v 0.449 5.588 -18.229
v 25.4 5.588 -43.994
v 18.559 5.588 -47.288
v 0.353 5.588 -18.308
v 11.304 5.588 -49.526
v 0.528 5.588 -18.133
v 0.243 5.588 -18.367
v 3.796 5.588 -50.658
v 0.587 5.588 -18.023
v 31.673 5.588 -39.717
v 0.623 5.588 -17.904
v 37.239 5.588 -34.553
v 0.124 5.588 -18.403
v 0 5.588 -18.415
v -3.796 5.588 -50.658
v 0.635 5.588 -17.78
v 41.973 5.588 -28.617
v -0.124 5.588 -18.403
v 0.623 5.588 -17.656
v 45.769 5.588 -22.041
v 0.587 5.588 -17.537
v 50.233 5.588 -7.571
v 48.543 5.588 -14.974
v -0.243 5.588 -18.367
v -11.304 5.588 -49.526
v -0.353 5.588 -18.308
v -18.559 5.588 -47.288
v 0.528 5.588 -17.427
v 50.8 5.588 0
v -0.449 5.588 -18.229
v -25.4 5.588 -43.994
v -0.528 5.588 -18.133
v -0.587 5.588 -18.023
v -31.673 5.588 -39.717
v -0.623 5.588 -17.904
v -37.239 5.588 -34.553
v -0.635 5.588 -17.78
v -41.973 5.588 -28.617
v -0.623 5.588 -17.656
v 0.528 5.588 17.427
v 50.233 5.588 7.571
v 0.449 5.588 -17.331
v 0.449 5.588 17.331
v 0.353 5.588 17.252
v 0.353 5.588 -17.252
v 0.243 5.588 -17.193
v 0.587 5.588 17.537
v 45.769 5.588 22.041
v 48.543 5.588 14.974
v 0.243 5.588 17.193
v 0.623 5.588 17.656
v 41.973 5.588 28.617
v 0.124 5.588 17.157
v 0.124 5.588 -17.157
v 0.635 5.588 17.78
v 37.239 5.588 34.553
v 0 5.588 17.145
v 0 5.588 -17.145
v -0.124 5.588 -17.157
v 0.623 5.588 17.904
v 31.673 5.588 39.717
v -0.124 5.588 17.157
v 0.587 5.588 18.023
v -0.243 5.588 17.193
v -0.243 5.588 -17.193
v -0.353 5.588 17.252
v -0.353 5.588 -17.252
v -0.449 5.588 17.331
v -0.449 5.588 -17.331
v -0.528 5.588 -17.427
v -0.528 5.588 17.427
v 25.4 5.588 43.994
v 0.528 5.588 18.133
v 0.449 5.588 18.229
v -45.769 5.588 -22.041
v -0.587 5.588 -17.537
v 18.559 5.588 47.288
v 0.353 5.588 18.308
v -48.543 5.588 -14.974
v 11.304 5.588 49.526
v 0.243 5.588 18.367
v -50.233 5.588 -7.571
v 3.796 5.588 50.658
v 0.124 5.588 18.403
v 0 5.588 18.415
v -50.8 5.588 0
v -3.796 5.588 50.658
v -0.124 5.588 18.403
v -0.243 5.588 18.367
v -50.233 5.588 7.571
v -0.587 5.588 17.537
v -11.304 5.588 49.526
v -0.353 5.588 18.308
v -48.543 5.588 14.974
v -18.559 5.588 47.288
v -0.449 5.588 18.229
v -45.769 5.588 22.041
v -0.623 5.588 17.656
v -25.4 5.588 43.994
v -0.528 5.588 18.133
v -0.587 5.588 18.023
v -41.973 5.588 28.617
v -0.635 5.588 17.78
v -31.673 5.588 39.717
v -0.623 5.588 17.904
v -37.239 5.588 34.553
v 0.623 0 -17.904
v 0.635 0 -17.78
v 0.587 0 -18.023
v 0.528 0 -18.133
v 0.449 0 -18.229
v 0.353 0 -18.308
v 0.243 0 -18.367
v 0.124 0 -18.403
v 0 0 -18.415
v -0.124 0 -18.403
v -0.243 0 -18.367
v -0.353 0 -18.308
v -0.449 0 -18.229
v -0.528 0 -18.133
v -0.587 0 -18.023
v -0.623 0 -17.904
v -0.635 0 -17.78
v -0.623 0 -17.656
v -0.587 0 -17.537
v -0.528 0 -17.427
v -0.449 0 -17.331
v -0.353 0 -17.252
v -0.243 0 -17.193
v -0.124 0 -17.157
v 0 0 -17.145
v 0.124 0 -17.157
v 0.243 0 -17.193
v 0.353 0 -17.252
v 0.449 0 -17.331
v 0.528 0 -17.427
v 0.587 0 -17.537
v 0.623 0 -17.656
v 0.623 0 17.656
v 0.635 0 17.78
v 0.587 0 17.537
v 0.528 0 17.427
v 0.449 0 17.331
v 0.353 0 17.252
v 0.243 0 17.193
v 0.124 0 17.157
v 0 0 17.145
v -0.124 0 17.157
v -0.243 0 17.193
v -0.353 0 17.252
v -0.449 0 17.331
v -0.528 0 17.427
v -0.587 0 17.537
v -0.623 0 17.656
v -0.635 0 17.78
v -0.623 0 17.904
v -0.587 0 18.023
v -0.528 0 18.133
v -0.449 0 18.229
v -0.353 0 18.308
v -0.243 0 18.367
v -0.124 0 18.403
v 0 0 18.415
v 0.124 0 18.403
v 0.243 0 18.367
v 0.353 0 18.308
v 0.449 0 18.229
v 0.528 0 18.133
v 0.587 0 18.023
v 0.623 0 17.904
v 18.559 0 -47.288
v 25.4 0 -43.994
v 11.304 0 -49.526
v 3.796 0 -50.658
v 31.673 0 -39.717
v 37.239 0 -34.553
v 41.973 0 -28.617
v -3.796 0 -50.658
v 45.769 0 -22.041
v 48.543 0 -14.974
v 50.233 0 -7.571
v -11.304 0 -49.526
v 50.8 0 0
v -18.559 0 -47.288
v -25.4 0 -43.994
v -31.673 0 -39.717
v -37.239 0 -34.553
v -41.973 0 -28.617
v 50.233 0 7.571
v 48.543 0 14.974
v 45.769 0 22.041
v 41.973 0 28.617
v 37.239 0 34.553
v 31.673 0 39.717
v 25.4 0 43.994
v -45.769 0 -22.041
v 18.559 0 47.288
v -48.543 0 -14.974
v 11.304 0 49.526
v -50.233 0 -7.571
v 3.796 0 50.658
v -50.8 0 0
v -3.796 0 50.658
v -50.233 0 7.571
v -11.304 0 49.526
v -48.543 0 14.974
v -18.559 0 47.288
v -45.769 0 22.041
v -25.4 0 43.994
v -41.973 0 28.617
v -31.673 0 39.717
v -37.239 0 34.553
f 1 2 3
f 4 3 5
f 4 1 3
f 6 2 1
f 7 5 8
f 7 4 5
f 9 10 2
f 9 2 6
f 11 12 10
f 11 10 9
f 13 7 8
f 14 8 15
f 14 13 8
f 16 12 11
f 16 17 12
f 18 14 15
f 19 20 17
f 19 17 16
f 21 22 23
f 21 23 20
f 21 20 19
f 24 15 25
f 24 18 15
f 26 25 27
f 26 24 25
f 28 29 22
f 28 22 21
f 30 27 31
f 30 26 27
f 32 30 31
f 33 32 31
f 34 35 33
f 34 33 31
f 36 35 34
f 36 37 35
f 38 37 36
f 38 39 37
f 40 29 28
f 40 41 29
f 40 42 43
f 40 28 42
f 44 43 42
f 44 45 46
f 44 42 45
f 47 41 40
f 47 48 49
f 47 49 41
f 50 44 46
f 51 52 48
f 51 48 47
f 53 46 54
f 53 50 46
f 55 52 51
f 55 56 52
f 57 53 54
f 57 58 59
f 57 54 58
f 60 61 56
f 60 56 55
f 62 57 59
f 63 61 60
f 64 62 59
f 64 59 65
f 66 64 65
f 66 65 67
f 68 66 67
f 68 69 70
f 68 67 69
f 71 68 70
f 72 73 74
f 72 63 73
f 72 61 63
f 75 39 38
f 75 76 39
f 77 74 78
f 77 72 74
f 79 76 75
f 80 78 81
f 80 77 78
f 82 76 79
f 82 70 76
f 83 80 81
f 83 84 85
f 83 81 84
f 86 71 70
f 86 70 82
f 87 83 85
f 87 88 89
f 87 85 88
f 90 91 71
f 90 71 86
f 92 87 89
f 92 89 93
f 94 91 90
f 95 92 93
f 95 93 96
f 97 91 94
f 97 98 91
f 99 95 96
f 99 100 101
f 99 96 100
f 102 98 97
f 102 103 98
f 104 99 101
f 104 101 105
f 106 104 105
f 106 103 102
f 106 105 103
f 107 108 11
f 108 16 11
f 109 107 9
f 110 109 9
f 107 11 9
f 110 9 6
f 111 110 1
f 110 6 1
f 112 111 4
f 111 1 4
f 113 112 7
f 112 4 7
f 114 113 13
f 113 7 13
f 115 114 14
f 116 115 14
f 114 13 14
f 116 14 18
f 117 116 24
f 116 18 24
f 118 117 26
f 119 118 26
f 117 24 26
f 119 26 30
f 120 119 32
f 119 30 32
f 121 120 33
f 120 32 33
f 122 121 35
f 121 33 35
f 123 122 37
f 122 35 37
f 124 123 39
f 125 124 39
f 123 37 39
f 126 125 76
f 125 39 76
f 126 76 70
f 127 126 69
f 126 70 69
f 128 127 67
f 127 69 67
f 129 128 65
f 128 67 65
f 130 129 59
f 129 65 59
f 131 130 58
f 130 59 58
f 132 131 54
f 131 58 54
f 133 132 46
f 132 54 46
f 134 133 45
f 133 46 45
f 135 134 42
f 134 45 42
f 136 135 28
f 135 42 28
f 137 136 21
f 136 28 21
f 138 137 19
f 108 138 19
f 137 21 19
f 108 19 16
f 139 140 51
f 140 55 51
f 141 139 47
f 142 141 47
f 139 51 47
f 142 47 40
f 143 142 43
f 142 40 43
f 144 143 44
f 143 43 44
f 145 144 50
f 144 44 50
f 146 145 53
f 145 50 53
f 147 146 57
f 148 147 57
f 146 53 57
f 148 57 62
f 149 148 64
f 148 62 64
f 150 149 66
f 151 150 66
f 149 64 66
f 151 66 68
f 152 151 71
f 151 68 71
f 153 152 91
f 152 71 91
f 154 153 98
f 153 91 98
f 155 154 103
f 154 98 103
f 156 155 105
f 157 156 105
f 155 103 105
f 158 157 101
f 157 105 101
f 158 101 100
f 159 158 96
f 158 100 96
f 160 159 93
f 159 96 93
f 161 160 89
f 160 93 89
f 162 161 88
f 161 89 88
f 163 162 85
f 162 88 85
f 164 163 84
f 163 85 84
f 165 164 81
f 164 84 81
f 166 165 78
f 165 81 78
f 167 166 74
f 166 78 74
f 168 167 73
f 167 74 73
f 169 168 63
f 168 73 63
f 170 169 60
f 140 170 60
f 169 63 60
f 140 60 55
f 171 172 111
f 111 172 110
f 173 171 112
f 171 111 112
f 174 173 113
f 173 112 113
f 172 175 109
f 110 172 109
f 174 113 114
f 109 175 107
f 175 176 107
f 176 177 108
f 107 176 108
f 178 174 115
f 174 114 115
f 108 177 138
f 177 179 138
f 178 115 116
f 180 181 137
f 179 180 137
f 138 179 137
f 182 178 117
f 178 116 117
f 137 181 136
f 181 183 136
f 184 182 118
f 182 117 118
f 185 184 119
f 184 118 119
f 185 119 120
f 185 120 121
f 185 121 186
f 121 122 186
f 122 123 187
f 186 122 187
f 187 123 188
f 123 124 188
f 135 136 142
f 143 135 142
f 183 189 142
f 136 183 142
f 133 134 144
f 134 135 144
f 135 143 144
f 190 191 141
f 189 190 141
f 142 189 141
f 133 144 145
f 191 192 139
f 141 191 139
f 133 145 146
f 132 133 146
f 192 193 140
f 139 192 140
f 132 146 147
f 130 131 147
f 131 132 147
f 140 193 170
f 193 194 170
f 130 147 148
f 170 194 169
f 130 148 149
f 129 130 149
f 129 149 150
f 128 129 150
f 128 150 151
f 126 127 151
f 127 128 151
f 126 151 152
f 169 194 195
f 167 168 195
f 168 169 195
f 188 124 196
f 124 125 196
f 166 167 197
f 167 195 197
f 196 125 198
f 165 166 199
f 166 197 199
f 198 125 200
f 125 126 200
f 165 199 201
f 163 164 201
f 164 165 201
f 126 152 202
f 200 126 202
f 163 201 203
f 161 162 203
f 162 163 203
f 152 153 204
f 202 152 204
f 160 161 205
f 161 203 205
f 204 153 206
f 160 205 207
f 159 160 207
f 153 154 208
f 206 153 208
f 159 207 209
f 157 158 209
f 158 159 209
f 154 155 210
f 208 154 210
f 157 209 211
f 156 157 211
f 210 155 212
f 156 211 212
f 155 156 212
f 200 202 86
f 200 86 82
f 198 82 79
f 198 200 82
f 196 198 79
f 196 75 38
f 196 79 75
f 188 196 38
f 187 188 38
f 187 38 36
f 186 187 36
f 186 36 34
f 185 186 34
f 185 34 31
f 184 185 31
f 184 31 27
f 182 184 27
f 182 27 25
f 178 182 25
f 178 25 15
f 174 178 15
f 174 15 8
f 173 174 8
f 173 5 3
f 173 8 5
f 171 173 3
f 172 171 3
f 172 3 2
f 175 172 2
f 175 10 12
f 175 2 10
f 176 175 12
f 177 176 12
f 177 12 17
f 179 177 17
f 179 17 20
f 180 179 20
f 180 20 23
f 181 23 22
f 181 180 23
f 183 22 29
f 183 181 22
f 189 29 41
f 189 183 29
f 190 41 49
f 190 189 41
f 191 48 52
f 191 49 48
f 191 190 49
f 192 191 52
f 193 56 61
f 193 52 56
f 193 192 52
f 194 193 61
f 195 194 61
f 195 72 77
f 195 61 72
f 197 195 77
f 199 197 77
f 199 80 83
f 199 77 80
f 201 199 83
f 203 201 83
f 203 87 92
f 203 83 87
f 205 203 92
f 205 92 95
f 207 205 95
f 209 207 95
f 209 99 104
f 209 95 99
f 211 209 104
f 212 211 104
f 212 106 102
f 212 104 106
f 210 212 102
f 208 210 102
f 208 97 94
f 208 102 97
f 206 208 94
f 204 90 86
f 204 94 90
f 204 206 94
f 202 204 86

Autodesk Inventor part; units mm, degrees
ref_plane "YZ Plane" through (0, 0, 0) normal (1, 0, 0) x (0, 1, 0)
ref_plane "XZ Plane" through (0, 0, 0) normal (0, 1, 0) x (-1, 0, 0)
ref_plane "XY Plane" through (0, 0, 0) normal (0, 0, 1) x (1, 0, 0)
sketch "Sketch1" plane through (0, 0, 0) normal (0, 1, 0) x (-1, 0, 0)
  circle A0 centre (0, 0) radius 50.8
  dimension "d0" = 101.6
extrude "Extrusion1" add sketch "Sketch1" along normal blind 5.588
sketch "Sketch2" plane through (0, 5.588, 0) normal (0, 1, 0) x (1, 0, 0)
  circle A0 centre (0, 17.78) radius 0.635
  point P0 (0, 0)
  dimension "d3" = 1.27
extrude "Extrusion2" cut sketch "Sketch2" against normal blind 5.588
sketch "Sketch3" plane through (0, 5.588, 0) normal (0, 1, 0) x (1, 0, 0)
  point P0 (0, 0)
sketch "Sketch4" plane through (0, 5.588, 0) normal (0, 1, 0) x (1, 0, 0)
  circle A0 centre (0, -17.78) radius 0.635
  point P0 (0, 0)
  dimension "d6" = 1.27
extrude "Extrusion3" cut sketch "Sketch4" against normal blind 5.588
properties part number "outerCup"
